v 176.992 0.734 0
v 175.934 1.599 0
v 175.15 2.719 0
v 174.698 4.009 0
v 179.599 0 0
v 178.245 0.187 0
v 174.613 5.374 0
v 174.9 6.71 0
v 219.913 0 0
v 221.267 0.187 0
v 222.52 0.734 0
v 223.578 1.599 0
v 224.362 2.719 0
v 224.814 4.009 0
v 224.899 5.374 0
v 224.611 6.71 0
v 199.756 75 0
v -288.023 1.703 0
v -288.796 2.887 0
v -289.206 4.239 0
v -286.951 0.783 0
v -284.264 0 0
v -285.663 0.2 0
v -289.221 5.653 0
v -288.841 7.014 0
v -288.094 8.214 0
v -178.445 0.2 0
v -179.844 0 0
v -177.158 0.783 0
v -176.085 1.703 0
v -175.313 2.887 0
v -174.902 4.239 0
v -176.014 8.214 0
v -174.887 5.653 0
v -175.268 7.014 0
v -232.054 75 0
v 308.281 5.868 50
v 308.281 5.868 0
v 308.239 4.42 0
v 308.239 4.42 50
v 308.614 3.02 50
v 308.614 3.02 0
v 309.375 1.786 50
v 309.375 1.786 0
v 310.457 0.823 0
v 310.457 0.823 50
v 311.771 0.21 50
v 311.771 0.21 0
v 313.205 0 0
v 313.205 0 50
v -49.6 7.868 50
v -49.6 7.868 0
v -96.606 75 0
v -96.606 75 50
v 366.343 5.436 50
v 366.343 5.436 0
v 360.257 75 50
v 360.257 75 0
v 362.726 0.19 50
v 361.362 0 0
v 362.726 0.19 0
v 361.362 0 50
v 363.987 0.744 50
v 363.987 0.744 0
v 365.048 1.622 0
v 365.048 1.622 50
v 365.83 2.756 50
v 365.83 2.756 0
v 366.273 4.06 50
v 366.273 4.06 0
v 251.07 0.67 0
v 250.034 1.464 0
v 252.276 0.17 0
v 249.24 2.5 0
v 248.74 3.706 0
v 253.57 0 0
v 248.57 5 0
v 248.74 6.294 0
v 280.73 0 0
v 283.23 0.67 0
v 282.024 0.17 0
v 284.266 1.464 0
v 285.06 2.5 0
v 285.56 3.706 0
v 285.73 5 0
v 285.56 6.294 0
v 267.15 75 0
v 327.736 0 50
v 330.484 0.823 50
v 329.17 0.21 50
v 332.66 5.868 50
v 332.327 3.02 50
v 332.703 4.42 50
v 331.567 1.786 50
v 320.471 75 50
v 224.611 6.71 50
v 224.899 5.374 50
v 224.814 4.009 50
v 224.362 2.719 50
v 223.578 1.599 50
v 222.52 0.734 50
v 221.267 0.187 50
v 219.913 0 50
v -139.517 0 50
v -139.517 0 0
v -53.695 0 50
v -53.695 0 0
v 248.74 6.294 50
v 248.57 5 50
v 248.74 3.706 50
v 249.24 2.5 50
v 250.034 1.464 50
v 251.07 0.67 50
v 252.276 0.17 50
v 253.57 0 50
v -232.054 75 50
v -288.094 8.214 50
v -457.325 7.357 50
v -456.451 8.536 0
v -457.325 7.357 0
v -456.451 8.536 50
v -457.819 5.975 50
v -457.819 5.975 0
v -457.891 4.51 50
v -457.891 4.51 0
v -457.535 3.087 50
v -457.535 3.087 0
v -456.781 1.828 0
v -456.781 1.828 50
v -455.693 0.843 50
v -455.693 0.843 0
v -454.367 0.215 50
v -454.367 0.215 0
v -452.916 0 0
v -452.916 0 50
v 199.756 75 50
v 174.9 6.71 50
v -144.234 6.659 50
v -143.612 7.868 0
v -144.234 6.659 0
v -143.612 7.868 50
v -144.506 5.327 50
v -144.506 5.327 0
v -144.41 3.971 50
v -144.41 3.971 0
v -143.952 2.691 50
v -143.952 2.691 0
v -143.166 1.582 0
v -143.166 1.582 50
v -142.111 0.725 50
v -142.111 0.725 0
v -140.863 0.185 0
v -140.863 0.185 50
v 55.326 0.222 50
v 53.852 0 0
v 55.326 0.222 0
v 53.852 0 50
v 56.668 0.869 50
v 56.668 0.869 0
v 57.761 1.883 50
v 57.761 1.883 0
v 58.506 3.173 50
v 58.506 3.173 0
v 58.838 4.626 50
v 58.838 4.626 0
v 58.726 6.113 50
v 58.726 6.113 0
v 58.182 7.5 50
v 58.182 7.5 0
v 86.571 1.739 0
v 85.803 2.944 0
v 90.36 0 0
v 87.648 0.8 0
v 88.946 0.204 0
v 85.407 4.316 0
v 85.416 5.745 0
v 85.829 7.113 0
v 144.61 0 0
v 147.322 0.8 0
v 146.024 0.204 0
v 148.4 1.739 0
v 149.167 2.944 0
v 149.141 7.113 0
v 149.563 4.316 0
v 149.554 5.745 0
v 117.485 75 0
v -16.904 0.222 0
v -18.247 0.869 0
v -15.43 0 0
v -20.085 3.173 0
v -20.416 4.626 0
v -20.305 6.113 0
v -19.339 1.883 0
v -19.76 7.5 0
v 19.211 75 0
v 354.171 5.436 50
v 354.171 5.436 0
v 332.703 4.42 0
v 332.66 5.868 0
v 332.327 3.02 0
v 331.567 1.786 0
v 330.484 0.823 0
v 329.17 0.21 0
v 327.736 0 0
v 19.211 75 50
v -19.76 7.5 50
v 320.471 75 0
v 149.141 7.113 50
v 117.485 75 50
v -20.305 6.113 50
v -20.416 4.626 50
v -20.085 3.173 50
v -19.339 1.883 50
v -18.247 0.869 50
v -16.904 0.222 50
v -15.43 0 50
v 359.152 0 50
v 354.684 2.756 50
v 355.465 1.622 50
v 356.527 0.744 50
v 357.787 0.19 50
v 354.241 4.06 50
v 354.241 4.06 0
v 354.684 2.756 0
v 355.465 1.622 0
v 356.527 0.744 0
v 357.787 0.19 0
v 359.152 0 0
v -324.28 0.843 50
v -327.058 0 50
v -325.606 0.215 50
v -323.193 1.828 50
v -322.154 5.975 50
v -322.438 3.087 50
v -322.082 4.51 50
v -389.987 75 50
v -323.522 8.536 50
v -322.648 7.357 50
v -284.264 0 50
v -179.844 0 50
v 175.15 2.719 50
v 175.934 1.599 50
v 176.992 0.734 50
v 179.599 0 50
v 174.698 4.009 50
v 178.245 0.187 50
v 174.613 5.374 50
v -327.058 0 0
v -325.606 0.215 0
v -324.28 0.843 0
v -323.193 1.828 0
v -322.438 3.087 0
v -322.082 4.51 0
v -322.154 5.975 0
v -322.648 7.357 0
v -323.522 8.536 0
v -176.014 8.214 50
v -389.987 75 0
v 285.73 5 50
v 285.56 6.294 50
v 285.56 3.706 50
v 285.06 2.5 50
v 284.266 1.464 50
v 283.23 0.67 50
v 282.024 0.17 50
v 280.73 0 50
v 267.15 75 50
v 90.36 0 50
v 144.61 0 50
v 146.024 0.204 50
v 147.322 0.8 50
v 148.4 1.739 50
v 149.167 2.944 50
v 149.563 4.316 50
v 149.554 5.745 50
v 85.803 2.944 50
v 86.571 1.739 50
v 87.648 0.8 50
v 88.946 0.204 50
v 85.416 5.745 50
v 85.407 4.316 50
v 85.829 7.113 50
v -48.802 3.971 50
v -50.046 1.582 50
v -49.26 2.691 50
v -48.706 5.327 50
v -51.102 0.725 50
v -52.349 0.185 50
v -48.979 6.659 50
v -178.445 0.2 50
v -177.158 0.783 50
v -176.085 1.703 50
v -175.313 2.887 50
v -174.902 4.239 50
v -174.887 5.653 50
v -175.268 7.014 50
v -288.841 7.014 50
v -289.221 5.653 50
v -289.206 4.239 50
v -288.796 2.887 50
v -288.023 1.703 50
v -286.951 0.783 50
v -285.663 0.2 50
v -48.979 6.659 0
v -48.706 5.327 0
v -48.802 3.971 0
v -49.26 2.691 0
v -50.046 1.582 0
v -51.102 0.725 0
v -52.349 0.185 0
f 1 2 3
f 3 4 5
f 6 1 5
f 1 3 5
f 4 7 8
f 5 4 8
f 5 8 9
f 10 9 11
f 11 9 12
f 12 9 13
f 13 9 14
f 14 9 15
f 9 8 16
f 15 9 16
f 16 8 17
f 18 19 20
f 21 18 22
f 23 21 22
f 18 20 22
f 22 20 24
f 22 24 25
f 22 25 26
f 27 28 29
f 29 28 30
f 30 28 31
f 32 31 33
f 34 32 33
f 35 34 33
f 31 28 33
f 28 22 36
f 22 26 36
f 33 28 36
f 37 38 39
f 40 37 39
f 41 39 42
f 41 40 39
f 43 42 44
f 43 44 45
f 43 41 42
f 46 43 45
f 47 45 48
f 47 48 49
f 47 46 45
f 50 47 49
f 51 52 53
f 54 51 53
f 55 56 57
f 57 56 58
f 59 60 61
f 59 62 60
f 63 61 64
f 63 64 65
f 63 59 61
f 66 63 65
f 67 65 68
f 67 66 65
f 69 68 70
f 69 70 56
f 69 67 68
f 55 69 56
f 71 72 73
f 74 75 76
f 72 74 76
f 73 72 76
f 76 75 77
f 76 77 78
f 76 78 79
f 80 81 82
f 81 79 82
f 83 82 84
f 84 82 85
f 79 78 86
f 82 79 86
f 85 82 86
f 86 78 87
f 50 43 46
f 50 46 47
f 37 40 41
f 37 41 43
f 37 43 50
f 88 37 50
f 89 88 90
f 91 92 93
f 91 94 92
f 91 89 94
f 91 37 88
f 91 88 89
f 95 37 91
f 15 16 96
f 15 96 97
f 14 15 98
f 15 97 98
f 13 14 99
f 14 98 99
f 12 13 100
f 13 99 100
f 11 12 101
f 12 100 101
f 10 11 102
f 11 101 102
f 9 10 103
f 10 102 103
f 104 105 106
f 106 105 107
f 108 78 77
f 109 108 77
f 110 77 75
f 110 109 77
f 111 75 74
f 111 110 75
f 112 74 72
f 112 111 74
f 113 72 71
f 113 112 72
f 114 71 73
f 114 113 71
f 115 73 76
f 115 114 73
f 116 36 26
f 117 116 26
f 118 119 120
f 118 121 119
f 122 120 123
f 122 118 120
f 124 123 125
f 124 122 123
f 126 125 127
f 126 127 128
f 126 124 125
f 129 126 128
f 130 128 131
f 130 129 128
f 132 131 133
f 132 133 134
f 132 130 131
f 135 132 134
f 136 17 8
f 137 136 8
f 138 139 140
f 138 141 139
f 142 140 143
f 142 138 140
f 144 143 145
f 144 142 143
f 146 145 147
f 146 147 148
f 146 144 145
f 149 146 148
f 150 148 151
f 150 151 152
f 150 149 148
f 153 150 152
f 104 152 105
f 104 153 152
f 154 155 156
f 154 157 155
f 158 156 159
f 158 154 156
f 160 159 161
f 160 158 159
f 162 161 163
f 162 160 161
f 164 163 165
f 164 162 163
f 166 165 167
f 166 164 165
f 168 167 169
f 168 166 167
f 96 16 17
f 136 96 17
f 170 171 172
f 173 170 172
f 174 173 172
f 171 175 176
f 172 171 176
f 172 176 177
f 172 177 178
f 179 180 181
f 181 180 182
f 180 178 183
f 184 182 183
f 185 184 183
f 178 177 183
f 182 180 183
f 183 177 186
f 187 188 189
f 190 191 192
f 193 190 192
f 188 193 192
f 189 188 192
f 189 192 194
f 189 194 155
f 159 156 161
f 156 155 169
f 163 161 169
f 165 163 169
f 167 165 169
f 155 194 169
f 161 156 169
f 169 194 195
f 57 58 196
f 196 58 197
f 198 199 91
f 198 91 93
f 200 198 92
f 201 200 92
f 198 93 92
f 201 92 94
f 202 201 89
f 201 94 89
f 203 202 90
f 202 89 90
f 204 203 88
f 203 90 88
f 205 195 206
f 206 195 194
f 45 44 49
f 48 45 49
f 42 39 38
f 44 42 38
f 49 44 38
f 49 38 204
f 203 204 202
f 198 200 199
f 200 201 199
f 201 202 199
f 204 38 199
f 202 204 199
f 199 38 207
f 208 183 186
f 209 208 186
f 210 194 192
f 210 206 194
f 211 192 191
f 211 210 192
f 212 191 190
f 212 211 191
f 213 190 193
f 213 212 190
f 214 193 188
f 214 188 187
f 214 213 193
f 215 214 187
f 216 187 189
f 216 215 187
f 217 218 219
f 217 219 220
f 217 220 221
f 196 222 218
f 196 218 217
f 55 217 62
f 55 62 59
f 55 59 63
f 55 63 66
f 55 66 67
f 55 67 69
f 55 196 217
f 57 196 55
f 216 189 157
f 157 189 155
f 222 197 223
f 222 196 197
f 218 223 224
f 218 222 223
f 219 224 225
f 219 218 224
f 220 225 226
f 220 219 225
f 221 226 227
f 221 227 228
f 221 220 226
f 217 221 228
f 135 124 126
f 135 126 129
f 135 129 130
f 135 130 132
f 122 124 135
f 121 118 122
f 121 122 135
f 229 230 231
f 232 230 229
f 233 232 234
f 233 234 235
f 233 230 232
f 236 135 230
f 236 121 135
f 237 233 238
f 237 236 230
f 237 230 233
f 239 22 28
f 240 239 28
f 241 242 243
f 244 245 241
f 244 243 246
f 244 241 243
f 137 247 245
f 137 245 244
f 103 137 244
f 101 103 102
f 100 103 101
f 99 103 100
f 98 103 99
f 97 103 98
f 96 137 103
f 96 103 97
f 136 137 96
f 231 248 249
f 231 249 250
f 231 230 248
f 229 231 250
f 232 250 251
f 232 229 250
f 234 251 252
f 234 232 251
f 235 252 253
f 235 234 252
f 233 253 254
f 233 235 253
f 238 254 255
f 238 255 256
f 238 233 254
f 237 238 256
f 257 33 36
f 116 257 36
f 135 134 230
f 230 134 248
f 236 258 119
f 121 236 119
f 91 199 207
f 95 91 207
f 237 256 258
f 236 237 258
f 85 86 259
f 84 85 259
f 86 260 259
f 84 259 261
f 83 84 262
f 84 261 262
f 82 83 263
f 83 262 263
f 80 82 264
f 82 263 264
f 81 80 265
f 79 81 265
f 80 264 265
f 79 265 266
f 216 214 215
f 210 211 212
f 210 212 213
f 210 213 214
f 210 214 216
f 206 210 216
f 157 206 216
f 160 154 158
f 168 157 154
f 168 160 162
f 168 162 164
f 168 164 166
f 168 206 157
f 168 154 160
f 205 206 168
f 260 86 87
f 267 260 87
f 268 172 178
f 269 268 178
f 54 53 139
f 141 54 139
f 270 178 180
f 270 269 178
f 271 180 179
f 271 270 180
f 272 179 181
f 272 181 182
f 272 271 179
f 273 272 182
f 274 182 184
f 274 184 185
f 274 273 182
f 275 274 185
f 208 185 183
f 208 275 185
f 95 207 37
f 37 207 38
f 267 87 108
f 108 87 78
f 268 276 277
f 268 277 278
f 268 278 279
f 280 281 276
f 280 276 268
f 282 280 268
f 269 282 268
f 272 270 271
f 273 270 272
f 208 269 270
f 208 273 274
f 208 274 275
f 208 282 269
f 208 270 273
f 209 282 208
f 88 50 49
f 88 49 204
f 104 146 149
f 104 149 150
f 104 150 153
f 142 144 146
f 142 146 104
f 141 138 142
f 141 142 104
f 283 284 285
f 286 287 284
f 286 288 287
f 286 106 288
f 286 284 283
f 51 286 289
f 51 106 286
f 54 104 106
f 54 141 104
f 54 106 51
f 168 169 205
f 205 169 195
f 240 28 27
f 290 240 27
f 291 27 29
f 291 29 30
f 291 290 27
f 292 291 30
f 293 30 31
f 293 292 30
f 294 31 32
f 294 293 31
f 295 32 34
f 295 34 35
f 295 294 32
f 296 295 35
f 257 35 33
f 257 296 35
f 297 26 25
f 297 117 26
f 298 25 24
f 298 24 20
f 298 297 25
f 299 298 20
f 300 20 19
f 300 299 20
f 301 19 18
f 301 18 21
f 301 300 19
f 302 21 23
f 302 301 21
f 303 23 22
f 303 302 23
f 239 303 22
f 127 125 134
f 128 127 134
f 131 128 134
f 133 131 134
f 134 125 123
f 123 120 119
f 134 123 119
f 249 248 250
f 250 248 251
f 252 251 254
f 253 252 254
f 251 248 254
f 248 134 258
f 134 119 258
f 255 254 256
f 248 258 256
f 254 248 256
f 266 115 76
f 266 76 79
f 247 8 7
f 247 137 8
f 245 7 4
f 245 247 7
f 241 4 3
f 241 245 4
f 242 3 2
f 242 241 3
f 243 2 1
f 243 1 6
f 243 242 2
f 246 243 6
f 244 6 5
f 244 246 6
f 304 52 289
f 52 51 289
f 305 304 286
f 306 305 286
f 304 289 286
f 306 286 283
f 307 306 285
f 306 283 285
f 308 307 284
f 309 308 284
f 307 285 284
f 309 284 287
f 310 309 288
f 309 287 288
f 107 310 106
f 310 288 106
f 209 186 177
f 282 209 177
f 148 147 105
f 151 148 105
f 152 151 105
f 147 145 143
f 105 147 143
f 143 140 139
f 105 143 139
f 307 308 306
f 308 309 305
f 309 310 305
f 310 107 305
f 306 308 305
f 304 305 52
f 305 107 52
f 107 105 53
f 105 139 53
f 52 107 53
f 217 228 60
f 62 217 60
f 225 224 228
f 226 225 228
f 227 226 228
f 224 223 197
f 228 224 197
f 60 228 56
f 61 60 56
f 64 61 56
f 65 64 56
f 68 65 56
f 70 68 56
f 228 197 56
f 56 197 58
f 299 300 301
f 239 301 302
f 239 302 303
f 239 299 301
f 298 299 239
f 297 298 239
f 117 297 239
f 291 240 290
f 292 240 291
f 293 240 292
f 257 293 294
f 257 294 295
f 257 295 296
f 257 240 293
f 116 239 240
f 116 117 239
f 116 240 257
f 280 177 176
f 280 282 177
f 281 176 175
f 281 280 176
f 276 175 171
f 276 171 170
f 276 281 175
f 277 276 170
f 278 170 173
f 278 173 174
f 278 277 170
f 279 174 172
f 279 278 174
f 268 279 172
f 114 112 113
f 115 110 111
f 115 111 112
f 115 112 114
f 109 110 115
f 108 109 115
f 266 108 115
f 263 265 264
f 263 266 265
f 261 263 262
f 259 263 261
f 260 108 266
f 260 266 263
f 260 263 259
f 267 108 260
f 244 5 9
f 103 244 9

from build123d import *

# Parameters (mm, degrees)
F1_DEPTH = 50
F2_R     = 5


with BuildPart() as f1:
    # F0 (on Top) → F1 (new body)
    with BuildSketch(Plane.XY):
        Polygon((-389.986576, 75), (-464.986576, 0), (-389.986576, 0), align=None)
        Polygon((-389.986576, 75), (-389.986576, 0), (-314.986576, 0), align=None)
        Polygon((-232.054104, 0), (-232.054104, 75), (-294.986576, 0), align=None)
        Polygon((-169.121632, 0), (-232.054104, 75), (-232.054104, 0), align=None)
        Polygon((-44.090501, 0), (-96.606066, 75), (-96.606066, 0), align=None)
        Polygon((-96.606066, 0), (-96.606066, 75), (-149.121632, 0), align=None)
        Polygon((19.210769, 0), (19.210769, 75), (-24.090501, 0), align=None)
        Polygon((62.512039, 0), (19.210769, 75), (19.210769, 0), align=None)
        Polygon((117.485114, 0), (117.485114, 75), (82.512039, 0), align=None)
        Polygon((152.458188, 0), (117.485114, 75), (117.485114, 0), align=None)
        Polygon((227.053723, 0), (199.755956, 75), (199.755956, 0), align=None)
        Polygon((199.755956, 0), (199.755956, 75), (172.458188, 0), align=None)
        Polygon((287.246102, 0), (267.149913, 75), (267.149913, 0), align=None)
        Polygon((333.695149, 0), (320.470626, 75), (320.470626, 0), align=None)
        Polygon((320.470626, 0), (320.470626, 75), (307.246102, 0), align=None)
        Polygon((360.256799, 0), (360.256799, 75), (353.695149, 0), align=None)
        Polygon((366.818449, 0), (360.256799, 75), (360.256799, 0), align=None)
        Polygon((267.149913, 0), (267.149913, 75), (247.053723, 0), align=None)
    extrude(amount=F1_DEPTH)

    # F2
    f2_edges = [f1.edges().sort_by_distance(p)[0] for p in [
        (-464.986576, 0, 25),
        (-314.986576, 0, 25),
        (-294.986576, 0, 25),
        (-169.121632, 0, 25),
        (-149.121632, 0, 25),
        (-44.090501, 0, 25),
        (-24.090501, 0, 25),
        (62.512039, 0, 25),
        (82.512039, 0, 25),
        (152.458188, 0, 25),
        (172.458188, 0, 25),
        (227.053723, 0, 25),
        (247.053723, 0, 25),
        (287.246102, 0, 25),
        (307.246102, 0, 25),
        (333.695149, 0, 25),
        (353.695149, 0, 25),
        (366.818449, 0, 25),
    ]]
    fillet(f2_edges, radius=F2_R)


solid = f1.part
